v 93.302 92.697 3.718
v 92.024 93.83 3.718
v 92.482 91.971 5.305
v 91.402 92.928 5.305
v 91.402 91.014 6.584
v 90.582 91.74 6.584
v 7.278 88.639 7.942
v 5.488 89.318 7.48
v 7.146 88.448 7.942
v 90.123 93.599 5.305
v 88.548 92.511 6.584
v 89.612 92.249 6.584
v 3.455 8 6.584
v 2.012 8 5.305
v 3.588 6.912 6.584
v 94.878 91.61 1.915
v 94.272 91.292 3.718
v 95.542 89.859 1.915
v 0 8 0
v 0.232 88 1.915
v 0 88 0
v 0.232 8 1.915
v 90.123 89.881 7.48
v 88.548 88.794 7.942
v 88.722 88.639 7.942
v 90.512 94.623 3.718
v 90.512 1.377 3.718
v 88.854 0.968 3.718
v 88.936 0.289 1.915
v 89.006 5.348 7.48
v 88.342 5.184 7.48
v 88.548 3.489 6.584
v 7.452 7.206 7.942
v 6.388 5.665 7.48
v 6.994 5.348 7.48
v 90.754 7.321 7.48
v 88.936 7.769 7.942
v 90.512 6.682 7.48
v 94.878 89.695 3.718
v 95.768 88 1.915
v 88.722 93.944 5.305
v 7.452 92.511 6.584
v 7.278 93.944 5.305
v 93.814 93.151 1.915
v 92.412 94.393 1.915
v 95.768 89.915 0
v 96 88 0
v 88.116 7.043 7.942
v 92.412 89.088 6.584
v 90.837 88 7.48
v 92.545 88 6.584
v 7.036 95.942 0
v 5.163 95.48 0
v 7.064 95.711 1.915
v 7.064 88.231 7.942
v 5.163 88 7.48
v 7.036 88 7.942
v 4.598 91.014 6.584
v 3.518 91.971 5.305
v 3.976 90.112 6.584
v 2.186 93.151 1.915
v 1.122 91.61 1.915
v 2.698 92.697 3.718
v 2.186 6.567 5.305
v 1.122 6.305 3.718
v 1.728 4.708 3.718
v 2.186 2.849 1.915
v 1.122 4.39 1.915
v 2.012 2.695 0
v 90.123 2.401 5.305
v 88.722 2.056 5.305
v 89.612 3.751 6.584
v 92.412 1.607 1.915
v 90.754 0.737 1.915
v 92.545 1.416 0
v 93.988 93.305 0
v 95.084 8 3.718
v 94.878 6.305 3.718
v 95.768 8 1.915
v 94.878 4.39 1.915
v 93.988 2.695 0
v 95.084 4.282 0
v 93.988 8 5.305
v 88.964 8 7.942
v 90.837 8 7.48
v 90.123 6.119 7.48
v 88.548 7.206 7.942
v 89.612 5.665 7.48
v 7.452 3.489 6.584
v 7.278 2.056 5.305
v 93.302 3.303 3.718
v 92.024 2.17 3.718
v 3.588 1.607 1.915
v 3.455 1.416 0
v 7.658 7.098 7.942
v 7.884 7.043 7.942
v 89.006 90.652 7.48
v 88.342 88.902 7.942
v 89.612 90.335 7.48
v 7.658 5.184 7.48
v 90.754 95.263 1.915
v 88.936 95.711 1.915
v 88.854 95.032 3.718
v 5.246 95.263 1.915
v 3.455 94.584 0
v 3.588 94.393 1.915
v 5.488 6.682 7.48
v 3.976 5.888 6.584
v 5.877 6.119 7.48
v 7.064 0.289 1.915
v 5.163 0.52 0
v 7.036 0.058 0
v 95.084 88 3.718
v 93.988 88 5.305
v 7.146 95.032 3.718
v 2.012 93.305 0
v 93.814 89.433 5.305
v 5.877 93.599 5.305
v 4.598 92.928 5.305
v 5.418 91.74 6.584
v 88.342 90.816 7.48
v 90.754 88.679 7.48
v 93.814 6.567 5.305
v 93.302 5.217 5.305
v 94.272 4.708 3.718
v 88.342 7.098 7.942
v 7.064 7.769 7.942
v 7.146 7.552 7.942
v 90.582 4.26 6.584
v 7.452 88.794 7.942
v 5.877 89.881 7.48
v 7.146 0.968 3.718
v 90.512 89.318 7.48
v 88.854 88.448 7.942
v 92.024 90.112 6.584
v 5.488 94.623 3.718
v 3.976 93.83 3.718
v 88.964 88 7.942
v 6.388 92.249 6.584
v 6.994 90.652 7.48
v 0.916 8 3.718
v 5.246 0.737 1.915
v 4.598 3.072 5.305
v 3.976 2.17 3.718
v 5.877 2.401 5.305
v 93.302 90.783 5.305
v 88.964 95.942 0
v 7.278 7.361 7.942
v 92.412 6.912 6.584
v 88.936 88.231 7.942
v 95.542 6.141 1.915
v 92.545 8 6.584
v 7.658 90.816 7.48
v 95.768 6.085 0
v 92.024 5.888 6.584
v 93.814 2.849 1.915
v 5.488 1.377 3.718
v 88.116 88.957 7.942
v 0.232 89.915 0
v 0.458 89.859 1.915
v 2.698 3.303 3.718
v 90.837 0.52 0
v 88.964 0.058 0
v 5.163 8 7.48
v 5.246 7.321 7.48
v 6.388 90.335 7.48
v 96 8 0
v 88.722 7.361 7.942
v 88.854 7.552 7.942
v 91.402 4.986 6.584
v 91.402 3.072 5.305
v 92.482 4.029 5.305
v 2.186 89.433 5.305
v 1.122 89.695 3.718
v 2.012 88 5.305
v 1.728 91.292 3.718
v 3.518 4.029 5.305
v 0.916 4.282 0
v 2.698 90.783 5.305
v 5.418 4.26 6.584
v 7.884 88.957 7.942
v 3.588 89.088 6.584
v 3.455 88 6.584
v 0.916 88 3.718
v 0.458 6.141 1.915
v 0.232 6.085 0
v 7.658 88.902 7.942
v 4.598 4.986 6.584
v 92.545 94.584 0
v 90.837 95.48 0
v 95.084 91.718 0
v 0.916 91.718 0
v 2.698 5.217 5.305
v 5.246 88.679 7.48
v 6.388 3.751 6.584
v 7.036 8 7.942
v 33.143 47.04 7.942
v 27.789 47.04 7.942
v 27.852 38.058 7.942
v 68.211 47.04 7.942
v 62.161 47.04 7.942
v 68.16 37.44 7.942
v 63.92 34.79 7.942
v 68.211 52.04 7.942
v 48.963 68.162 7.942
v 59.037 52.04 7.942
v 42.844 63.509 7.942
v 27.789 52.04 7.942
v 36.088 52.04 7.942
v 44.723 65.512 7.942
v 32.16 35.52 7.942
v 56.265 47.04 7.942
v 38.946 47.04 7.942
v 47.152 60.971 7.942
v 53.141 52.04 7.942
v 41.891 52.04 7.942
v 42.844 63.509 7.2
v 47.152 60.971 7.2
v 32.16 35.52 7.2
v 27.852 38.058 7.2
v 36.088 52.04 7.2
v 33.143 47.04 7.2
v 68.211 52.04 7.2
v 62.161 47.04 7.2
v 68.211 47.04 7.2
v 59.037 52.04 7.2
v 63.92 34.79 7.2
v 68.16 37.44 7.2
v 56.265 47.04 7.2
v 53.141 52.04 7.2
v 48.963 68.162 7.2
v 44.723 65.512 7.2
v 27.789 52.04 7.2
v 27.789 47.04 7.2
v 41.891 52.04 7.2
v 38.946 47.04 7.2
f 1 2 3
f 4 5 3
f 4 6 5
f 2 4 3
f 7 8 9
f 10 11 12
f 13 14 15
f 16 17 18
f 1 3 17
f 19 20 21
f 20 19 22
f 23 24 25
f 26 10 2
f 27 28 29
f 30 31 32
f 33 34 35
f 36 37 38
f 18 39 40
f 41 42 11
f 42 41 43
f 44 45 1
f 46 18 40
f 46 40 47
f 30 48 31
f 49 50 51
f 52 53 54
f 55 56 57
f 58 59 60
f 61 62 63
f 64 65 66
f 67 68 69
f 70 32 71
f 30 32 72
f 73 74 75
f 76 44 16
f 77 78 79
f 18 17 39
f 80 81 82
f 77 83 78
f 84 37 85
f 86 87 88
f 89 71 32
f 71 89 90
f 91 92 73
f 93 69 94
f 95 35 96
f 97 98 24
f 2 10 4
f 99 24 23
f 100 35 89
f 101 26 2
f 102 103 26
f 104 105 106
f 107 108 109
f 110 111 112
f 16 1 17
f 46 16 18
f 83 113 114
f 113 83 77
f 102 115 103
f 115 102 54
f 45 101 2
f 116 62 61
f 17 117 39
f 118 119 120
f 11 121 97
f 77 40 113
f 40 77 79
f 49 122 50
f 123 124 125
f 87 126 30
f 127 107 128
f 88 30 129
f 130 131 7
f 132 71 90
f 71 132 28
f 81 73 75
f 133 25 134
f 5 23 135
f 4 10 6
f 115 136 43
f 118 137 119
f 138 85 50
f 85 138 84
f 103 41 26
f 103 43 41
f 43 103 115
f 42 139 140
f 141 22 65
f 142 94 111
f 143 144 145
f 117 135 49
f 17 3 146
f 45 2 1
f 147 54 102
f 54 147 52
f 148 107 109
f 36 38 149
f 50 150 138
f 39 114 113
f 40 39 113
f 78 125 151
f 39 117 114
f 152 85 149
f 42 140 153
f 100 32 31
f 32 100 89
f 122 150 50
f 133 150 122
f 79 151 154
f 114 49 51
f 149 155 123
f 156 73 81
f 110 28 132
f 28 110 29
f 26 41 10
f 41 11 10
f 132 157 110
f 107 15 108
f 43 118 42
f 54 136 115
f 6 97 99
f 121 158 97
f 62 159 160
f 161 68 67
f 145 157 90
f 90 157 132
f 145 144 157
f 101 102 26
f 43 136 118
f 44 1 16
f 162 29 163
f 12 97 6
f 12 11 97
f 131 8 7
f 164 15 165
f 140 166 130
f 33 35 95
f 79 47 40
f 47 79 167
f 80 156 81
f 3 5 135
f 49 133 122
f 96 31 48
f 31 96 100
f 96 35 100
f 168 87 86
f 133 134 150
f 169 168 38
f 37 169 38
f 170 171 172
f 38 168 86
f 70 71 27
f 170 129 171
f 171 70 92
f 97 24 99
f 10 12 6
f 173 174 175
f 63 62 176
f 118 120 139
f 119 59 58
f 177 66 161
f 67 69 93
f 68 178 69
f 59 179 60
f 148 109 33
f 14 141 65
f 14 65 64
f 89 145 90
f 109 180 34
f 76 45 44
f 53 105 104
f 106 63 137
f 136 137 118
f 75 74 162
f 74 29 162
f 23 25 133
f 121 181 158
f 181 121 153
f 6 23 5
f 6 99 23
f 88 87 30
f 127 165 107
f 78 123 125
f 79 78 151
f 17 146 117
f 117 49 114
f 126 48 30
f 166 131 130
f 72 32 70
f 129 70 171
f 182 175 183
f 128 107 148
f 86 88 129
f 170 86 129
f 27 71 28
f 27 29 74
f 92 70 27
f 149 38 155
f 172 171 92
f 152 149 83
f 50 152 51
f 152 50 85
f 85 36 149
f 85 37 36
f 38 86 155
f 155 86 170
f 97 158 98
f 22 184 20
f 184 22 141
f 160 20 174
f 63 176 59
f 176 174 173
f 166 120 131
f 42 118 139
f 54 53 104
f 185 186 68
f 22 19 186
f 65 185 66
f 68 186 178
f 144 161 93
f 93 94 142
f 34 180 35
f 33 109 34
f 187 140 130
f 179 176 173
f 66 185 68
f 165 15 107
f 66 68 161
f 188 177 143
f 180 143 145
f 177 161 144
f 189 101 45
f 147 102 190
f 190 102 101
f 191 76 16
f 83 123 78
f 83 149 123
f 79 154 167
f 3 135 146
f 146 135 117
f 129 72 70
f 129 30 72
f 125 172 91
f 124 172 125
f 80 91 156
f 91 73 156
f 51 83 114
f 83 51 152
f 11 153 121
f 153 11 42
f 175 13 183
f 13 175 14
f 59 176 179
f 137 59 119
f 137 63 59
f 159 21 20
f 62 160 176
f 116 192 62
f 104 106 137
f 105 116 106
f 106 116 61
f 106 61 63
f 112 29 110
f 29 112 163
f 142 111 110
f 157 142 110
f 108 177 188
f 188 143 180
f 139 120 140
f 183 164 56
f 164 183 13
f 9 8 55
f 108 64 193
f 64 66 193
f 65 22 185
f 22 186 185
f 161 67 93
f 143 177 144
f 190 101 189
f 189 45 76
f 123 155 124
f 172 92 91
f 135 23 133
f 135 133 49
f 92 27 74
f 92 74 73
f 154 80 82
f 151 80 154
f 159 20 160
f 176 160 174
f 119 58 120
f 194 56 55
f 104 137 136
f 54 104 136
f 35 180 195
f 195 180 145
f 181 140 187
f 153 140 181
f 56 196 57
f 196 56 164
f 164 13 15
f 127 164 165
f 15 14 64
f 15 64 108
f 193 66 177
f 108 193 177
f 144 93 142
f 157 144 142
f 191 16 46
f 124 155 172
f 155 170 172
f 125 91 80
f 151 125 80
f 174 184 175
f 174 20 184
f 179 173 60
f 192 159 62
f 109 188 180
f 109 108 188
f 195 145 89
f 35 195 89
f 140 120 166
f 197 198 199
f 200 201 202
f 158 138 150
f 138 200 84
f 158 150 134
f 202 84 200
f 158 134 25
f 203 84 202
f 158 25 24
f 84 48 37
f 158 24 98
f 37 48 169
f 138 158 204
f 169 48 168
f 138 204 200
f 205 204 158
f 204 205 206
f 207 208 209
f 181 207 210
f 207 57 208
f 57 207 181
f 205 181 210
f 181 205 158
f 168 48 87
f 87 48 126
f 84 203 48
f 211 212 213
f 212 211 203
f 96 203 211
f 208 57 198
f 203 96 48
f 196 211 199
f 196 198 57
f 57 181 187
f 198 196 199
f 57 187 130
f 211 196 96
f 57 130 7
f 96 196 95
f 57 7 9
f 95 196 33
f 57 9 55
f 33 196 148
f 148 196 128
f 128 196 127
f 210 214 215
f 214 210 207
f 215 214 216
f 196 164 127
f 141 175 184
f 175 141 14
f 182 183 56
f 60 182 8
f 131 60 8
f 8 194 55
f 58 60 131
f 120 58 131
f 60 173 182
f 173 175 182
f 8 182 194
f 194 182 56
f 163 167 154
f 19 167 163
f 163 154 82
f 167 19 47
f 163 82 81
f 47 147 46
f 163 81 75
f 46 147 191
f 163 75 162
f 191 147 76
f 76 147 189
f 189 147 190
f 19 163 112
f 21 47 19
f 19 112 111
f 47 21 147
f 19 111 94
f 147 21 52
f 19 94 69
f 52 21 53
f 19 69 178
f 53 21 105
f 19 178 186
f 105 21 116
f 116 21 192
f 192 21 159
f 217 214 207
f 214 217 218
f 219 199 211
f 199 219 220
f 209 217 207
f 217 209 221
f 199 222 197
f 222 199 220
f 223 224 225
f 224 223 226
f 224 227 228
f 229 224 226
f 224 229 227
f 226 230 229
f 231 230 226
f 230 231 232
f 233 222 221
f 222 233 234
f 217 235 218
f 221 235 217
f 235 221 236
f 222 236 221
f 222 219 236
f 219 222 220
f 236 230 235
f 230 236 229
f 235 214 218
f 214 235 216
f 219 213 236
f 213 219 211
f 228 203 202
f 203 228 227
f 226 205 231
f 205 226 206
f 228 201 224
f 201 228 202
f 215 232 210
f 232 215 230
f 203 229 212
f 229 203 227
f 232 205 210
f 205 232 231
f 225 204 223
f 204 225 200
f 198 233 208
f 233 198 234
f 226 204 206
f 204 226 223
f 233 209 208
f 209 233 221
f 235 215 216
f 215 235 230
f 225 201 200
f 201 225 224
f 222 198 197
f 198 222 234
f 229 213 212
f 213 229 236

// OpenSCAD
// [FL_INDEX: keywords="openscad, 3d_parametric, RubyMotion_Logo__upper, csg_solid" | COT="Parametric OpenSCAD design from 3DCodeverse"]
// Title: RubyMotion Logo (upper)

//CUSTOMIZER VARIABLES

// edge length (width/height)
size = 80;

// for the "A" character
engrave_depth = .8;

//CUSTOMIZER VARIABLES END


height = size/10;
radius = size/10;
outer_size = size + 2*radius;
engrave_thickness = outer_size / 19.2;

l_a = outer_size/3.25;
l_b = outer_size/2.65;
l_c = outer_size/2.375;

a_a = 59.5 * 1;
a_b = 122 * 1;
a_c = 0 * 1;

difference() {
    color("lightgray") translate([radius,radius,-height]) difference() {
        // create a rounded cube
        translate([0,0,height]) {
            hull() {
                sphere(r=radius);
                translate([size,0,0]) sphere(r=radius);
                translate([size,size,0]) sphere(r=radius);
                translate([0,size,0]) sphere(r=radius);
            }
        }

        // cut away the lower half
        translate([-radius,-radius,0]) cube([size+radius*2,size+radius*2,height]);
    }

    color("gray") union() {
        // the three bars representing the "A"
        translate([outer_size*0.335,outer_size*0.37,height-engrave_depth])
            rotate([0,0,a_a])
                cube([l_a, engrave_thickness, engrave_depth]);

        translate([outer_size*0.71,outer_size*0.39,height-engrave_depth])
            rotate([0,0,a_b])
                cube([l_b, engrave_thickness, engrave_depth]);

        translate([(outer_size-l_c)/2,outer_size*0.49,height-engrave_depth])
            rotate([0,0,a_c])
                cube([l_c, engrave_thickness, engrave_depth]);


    }
}
